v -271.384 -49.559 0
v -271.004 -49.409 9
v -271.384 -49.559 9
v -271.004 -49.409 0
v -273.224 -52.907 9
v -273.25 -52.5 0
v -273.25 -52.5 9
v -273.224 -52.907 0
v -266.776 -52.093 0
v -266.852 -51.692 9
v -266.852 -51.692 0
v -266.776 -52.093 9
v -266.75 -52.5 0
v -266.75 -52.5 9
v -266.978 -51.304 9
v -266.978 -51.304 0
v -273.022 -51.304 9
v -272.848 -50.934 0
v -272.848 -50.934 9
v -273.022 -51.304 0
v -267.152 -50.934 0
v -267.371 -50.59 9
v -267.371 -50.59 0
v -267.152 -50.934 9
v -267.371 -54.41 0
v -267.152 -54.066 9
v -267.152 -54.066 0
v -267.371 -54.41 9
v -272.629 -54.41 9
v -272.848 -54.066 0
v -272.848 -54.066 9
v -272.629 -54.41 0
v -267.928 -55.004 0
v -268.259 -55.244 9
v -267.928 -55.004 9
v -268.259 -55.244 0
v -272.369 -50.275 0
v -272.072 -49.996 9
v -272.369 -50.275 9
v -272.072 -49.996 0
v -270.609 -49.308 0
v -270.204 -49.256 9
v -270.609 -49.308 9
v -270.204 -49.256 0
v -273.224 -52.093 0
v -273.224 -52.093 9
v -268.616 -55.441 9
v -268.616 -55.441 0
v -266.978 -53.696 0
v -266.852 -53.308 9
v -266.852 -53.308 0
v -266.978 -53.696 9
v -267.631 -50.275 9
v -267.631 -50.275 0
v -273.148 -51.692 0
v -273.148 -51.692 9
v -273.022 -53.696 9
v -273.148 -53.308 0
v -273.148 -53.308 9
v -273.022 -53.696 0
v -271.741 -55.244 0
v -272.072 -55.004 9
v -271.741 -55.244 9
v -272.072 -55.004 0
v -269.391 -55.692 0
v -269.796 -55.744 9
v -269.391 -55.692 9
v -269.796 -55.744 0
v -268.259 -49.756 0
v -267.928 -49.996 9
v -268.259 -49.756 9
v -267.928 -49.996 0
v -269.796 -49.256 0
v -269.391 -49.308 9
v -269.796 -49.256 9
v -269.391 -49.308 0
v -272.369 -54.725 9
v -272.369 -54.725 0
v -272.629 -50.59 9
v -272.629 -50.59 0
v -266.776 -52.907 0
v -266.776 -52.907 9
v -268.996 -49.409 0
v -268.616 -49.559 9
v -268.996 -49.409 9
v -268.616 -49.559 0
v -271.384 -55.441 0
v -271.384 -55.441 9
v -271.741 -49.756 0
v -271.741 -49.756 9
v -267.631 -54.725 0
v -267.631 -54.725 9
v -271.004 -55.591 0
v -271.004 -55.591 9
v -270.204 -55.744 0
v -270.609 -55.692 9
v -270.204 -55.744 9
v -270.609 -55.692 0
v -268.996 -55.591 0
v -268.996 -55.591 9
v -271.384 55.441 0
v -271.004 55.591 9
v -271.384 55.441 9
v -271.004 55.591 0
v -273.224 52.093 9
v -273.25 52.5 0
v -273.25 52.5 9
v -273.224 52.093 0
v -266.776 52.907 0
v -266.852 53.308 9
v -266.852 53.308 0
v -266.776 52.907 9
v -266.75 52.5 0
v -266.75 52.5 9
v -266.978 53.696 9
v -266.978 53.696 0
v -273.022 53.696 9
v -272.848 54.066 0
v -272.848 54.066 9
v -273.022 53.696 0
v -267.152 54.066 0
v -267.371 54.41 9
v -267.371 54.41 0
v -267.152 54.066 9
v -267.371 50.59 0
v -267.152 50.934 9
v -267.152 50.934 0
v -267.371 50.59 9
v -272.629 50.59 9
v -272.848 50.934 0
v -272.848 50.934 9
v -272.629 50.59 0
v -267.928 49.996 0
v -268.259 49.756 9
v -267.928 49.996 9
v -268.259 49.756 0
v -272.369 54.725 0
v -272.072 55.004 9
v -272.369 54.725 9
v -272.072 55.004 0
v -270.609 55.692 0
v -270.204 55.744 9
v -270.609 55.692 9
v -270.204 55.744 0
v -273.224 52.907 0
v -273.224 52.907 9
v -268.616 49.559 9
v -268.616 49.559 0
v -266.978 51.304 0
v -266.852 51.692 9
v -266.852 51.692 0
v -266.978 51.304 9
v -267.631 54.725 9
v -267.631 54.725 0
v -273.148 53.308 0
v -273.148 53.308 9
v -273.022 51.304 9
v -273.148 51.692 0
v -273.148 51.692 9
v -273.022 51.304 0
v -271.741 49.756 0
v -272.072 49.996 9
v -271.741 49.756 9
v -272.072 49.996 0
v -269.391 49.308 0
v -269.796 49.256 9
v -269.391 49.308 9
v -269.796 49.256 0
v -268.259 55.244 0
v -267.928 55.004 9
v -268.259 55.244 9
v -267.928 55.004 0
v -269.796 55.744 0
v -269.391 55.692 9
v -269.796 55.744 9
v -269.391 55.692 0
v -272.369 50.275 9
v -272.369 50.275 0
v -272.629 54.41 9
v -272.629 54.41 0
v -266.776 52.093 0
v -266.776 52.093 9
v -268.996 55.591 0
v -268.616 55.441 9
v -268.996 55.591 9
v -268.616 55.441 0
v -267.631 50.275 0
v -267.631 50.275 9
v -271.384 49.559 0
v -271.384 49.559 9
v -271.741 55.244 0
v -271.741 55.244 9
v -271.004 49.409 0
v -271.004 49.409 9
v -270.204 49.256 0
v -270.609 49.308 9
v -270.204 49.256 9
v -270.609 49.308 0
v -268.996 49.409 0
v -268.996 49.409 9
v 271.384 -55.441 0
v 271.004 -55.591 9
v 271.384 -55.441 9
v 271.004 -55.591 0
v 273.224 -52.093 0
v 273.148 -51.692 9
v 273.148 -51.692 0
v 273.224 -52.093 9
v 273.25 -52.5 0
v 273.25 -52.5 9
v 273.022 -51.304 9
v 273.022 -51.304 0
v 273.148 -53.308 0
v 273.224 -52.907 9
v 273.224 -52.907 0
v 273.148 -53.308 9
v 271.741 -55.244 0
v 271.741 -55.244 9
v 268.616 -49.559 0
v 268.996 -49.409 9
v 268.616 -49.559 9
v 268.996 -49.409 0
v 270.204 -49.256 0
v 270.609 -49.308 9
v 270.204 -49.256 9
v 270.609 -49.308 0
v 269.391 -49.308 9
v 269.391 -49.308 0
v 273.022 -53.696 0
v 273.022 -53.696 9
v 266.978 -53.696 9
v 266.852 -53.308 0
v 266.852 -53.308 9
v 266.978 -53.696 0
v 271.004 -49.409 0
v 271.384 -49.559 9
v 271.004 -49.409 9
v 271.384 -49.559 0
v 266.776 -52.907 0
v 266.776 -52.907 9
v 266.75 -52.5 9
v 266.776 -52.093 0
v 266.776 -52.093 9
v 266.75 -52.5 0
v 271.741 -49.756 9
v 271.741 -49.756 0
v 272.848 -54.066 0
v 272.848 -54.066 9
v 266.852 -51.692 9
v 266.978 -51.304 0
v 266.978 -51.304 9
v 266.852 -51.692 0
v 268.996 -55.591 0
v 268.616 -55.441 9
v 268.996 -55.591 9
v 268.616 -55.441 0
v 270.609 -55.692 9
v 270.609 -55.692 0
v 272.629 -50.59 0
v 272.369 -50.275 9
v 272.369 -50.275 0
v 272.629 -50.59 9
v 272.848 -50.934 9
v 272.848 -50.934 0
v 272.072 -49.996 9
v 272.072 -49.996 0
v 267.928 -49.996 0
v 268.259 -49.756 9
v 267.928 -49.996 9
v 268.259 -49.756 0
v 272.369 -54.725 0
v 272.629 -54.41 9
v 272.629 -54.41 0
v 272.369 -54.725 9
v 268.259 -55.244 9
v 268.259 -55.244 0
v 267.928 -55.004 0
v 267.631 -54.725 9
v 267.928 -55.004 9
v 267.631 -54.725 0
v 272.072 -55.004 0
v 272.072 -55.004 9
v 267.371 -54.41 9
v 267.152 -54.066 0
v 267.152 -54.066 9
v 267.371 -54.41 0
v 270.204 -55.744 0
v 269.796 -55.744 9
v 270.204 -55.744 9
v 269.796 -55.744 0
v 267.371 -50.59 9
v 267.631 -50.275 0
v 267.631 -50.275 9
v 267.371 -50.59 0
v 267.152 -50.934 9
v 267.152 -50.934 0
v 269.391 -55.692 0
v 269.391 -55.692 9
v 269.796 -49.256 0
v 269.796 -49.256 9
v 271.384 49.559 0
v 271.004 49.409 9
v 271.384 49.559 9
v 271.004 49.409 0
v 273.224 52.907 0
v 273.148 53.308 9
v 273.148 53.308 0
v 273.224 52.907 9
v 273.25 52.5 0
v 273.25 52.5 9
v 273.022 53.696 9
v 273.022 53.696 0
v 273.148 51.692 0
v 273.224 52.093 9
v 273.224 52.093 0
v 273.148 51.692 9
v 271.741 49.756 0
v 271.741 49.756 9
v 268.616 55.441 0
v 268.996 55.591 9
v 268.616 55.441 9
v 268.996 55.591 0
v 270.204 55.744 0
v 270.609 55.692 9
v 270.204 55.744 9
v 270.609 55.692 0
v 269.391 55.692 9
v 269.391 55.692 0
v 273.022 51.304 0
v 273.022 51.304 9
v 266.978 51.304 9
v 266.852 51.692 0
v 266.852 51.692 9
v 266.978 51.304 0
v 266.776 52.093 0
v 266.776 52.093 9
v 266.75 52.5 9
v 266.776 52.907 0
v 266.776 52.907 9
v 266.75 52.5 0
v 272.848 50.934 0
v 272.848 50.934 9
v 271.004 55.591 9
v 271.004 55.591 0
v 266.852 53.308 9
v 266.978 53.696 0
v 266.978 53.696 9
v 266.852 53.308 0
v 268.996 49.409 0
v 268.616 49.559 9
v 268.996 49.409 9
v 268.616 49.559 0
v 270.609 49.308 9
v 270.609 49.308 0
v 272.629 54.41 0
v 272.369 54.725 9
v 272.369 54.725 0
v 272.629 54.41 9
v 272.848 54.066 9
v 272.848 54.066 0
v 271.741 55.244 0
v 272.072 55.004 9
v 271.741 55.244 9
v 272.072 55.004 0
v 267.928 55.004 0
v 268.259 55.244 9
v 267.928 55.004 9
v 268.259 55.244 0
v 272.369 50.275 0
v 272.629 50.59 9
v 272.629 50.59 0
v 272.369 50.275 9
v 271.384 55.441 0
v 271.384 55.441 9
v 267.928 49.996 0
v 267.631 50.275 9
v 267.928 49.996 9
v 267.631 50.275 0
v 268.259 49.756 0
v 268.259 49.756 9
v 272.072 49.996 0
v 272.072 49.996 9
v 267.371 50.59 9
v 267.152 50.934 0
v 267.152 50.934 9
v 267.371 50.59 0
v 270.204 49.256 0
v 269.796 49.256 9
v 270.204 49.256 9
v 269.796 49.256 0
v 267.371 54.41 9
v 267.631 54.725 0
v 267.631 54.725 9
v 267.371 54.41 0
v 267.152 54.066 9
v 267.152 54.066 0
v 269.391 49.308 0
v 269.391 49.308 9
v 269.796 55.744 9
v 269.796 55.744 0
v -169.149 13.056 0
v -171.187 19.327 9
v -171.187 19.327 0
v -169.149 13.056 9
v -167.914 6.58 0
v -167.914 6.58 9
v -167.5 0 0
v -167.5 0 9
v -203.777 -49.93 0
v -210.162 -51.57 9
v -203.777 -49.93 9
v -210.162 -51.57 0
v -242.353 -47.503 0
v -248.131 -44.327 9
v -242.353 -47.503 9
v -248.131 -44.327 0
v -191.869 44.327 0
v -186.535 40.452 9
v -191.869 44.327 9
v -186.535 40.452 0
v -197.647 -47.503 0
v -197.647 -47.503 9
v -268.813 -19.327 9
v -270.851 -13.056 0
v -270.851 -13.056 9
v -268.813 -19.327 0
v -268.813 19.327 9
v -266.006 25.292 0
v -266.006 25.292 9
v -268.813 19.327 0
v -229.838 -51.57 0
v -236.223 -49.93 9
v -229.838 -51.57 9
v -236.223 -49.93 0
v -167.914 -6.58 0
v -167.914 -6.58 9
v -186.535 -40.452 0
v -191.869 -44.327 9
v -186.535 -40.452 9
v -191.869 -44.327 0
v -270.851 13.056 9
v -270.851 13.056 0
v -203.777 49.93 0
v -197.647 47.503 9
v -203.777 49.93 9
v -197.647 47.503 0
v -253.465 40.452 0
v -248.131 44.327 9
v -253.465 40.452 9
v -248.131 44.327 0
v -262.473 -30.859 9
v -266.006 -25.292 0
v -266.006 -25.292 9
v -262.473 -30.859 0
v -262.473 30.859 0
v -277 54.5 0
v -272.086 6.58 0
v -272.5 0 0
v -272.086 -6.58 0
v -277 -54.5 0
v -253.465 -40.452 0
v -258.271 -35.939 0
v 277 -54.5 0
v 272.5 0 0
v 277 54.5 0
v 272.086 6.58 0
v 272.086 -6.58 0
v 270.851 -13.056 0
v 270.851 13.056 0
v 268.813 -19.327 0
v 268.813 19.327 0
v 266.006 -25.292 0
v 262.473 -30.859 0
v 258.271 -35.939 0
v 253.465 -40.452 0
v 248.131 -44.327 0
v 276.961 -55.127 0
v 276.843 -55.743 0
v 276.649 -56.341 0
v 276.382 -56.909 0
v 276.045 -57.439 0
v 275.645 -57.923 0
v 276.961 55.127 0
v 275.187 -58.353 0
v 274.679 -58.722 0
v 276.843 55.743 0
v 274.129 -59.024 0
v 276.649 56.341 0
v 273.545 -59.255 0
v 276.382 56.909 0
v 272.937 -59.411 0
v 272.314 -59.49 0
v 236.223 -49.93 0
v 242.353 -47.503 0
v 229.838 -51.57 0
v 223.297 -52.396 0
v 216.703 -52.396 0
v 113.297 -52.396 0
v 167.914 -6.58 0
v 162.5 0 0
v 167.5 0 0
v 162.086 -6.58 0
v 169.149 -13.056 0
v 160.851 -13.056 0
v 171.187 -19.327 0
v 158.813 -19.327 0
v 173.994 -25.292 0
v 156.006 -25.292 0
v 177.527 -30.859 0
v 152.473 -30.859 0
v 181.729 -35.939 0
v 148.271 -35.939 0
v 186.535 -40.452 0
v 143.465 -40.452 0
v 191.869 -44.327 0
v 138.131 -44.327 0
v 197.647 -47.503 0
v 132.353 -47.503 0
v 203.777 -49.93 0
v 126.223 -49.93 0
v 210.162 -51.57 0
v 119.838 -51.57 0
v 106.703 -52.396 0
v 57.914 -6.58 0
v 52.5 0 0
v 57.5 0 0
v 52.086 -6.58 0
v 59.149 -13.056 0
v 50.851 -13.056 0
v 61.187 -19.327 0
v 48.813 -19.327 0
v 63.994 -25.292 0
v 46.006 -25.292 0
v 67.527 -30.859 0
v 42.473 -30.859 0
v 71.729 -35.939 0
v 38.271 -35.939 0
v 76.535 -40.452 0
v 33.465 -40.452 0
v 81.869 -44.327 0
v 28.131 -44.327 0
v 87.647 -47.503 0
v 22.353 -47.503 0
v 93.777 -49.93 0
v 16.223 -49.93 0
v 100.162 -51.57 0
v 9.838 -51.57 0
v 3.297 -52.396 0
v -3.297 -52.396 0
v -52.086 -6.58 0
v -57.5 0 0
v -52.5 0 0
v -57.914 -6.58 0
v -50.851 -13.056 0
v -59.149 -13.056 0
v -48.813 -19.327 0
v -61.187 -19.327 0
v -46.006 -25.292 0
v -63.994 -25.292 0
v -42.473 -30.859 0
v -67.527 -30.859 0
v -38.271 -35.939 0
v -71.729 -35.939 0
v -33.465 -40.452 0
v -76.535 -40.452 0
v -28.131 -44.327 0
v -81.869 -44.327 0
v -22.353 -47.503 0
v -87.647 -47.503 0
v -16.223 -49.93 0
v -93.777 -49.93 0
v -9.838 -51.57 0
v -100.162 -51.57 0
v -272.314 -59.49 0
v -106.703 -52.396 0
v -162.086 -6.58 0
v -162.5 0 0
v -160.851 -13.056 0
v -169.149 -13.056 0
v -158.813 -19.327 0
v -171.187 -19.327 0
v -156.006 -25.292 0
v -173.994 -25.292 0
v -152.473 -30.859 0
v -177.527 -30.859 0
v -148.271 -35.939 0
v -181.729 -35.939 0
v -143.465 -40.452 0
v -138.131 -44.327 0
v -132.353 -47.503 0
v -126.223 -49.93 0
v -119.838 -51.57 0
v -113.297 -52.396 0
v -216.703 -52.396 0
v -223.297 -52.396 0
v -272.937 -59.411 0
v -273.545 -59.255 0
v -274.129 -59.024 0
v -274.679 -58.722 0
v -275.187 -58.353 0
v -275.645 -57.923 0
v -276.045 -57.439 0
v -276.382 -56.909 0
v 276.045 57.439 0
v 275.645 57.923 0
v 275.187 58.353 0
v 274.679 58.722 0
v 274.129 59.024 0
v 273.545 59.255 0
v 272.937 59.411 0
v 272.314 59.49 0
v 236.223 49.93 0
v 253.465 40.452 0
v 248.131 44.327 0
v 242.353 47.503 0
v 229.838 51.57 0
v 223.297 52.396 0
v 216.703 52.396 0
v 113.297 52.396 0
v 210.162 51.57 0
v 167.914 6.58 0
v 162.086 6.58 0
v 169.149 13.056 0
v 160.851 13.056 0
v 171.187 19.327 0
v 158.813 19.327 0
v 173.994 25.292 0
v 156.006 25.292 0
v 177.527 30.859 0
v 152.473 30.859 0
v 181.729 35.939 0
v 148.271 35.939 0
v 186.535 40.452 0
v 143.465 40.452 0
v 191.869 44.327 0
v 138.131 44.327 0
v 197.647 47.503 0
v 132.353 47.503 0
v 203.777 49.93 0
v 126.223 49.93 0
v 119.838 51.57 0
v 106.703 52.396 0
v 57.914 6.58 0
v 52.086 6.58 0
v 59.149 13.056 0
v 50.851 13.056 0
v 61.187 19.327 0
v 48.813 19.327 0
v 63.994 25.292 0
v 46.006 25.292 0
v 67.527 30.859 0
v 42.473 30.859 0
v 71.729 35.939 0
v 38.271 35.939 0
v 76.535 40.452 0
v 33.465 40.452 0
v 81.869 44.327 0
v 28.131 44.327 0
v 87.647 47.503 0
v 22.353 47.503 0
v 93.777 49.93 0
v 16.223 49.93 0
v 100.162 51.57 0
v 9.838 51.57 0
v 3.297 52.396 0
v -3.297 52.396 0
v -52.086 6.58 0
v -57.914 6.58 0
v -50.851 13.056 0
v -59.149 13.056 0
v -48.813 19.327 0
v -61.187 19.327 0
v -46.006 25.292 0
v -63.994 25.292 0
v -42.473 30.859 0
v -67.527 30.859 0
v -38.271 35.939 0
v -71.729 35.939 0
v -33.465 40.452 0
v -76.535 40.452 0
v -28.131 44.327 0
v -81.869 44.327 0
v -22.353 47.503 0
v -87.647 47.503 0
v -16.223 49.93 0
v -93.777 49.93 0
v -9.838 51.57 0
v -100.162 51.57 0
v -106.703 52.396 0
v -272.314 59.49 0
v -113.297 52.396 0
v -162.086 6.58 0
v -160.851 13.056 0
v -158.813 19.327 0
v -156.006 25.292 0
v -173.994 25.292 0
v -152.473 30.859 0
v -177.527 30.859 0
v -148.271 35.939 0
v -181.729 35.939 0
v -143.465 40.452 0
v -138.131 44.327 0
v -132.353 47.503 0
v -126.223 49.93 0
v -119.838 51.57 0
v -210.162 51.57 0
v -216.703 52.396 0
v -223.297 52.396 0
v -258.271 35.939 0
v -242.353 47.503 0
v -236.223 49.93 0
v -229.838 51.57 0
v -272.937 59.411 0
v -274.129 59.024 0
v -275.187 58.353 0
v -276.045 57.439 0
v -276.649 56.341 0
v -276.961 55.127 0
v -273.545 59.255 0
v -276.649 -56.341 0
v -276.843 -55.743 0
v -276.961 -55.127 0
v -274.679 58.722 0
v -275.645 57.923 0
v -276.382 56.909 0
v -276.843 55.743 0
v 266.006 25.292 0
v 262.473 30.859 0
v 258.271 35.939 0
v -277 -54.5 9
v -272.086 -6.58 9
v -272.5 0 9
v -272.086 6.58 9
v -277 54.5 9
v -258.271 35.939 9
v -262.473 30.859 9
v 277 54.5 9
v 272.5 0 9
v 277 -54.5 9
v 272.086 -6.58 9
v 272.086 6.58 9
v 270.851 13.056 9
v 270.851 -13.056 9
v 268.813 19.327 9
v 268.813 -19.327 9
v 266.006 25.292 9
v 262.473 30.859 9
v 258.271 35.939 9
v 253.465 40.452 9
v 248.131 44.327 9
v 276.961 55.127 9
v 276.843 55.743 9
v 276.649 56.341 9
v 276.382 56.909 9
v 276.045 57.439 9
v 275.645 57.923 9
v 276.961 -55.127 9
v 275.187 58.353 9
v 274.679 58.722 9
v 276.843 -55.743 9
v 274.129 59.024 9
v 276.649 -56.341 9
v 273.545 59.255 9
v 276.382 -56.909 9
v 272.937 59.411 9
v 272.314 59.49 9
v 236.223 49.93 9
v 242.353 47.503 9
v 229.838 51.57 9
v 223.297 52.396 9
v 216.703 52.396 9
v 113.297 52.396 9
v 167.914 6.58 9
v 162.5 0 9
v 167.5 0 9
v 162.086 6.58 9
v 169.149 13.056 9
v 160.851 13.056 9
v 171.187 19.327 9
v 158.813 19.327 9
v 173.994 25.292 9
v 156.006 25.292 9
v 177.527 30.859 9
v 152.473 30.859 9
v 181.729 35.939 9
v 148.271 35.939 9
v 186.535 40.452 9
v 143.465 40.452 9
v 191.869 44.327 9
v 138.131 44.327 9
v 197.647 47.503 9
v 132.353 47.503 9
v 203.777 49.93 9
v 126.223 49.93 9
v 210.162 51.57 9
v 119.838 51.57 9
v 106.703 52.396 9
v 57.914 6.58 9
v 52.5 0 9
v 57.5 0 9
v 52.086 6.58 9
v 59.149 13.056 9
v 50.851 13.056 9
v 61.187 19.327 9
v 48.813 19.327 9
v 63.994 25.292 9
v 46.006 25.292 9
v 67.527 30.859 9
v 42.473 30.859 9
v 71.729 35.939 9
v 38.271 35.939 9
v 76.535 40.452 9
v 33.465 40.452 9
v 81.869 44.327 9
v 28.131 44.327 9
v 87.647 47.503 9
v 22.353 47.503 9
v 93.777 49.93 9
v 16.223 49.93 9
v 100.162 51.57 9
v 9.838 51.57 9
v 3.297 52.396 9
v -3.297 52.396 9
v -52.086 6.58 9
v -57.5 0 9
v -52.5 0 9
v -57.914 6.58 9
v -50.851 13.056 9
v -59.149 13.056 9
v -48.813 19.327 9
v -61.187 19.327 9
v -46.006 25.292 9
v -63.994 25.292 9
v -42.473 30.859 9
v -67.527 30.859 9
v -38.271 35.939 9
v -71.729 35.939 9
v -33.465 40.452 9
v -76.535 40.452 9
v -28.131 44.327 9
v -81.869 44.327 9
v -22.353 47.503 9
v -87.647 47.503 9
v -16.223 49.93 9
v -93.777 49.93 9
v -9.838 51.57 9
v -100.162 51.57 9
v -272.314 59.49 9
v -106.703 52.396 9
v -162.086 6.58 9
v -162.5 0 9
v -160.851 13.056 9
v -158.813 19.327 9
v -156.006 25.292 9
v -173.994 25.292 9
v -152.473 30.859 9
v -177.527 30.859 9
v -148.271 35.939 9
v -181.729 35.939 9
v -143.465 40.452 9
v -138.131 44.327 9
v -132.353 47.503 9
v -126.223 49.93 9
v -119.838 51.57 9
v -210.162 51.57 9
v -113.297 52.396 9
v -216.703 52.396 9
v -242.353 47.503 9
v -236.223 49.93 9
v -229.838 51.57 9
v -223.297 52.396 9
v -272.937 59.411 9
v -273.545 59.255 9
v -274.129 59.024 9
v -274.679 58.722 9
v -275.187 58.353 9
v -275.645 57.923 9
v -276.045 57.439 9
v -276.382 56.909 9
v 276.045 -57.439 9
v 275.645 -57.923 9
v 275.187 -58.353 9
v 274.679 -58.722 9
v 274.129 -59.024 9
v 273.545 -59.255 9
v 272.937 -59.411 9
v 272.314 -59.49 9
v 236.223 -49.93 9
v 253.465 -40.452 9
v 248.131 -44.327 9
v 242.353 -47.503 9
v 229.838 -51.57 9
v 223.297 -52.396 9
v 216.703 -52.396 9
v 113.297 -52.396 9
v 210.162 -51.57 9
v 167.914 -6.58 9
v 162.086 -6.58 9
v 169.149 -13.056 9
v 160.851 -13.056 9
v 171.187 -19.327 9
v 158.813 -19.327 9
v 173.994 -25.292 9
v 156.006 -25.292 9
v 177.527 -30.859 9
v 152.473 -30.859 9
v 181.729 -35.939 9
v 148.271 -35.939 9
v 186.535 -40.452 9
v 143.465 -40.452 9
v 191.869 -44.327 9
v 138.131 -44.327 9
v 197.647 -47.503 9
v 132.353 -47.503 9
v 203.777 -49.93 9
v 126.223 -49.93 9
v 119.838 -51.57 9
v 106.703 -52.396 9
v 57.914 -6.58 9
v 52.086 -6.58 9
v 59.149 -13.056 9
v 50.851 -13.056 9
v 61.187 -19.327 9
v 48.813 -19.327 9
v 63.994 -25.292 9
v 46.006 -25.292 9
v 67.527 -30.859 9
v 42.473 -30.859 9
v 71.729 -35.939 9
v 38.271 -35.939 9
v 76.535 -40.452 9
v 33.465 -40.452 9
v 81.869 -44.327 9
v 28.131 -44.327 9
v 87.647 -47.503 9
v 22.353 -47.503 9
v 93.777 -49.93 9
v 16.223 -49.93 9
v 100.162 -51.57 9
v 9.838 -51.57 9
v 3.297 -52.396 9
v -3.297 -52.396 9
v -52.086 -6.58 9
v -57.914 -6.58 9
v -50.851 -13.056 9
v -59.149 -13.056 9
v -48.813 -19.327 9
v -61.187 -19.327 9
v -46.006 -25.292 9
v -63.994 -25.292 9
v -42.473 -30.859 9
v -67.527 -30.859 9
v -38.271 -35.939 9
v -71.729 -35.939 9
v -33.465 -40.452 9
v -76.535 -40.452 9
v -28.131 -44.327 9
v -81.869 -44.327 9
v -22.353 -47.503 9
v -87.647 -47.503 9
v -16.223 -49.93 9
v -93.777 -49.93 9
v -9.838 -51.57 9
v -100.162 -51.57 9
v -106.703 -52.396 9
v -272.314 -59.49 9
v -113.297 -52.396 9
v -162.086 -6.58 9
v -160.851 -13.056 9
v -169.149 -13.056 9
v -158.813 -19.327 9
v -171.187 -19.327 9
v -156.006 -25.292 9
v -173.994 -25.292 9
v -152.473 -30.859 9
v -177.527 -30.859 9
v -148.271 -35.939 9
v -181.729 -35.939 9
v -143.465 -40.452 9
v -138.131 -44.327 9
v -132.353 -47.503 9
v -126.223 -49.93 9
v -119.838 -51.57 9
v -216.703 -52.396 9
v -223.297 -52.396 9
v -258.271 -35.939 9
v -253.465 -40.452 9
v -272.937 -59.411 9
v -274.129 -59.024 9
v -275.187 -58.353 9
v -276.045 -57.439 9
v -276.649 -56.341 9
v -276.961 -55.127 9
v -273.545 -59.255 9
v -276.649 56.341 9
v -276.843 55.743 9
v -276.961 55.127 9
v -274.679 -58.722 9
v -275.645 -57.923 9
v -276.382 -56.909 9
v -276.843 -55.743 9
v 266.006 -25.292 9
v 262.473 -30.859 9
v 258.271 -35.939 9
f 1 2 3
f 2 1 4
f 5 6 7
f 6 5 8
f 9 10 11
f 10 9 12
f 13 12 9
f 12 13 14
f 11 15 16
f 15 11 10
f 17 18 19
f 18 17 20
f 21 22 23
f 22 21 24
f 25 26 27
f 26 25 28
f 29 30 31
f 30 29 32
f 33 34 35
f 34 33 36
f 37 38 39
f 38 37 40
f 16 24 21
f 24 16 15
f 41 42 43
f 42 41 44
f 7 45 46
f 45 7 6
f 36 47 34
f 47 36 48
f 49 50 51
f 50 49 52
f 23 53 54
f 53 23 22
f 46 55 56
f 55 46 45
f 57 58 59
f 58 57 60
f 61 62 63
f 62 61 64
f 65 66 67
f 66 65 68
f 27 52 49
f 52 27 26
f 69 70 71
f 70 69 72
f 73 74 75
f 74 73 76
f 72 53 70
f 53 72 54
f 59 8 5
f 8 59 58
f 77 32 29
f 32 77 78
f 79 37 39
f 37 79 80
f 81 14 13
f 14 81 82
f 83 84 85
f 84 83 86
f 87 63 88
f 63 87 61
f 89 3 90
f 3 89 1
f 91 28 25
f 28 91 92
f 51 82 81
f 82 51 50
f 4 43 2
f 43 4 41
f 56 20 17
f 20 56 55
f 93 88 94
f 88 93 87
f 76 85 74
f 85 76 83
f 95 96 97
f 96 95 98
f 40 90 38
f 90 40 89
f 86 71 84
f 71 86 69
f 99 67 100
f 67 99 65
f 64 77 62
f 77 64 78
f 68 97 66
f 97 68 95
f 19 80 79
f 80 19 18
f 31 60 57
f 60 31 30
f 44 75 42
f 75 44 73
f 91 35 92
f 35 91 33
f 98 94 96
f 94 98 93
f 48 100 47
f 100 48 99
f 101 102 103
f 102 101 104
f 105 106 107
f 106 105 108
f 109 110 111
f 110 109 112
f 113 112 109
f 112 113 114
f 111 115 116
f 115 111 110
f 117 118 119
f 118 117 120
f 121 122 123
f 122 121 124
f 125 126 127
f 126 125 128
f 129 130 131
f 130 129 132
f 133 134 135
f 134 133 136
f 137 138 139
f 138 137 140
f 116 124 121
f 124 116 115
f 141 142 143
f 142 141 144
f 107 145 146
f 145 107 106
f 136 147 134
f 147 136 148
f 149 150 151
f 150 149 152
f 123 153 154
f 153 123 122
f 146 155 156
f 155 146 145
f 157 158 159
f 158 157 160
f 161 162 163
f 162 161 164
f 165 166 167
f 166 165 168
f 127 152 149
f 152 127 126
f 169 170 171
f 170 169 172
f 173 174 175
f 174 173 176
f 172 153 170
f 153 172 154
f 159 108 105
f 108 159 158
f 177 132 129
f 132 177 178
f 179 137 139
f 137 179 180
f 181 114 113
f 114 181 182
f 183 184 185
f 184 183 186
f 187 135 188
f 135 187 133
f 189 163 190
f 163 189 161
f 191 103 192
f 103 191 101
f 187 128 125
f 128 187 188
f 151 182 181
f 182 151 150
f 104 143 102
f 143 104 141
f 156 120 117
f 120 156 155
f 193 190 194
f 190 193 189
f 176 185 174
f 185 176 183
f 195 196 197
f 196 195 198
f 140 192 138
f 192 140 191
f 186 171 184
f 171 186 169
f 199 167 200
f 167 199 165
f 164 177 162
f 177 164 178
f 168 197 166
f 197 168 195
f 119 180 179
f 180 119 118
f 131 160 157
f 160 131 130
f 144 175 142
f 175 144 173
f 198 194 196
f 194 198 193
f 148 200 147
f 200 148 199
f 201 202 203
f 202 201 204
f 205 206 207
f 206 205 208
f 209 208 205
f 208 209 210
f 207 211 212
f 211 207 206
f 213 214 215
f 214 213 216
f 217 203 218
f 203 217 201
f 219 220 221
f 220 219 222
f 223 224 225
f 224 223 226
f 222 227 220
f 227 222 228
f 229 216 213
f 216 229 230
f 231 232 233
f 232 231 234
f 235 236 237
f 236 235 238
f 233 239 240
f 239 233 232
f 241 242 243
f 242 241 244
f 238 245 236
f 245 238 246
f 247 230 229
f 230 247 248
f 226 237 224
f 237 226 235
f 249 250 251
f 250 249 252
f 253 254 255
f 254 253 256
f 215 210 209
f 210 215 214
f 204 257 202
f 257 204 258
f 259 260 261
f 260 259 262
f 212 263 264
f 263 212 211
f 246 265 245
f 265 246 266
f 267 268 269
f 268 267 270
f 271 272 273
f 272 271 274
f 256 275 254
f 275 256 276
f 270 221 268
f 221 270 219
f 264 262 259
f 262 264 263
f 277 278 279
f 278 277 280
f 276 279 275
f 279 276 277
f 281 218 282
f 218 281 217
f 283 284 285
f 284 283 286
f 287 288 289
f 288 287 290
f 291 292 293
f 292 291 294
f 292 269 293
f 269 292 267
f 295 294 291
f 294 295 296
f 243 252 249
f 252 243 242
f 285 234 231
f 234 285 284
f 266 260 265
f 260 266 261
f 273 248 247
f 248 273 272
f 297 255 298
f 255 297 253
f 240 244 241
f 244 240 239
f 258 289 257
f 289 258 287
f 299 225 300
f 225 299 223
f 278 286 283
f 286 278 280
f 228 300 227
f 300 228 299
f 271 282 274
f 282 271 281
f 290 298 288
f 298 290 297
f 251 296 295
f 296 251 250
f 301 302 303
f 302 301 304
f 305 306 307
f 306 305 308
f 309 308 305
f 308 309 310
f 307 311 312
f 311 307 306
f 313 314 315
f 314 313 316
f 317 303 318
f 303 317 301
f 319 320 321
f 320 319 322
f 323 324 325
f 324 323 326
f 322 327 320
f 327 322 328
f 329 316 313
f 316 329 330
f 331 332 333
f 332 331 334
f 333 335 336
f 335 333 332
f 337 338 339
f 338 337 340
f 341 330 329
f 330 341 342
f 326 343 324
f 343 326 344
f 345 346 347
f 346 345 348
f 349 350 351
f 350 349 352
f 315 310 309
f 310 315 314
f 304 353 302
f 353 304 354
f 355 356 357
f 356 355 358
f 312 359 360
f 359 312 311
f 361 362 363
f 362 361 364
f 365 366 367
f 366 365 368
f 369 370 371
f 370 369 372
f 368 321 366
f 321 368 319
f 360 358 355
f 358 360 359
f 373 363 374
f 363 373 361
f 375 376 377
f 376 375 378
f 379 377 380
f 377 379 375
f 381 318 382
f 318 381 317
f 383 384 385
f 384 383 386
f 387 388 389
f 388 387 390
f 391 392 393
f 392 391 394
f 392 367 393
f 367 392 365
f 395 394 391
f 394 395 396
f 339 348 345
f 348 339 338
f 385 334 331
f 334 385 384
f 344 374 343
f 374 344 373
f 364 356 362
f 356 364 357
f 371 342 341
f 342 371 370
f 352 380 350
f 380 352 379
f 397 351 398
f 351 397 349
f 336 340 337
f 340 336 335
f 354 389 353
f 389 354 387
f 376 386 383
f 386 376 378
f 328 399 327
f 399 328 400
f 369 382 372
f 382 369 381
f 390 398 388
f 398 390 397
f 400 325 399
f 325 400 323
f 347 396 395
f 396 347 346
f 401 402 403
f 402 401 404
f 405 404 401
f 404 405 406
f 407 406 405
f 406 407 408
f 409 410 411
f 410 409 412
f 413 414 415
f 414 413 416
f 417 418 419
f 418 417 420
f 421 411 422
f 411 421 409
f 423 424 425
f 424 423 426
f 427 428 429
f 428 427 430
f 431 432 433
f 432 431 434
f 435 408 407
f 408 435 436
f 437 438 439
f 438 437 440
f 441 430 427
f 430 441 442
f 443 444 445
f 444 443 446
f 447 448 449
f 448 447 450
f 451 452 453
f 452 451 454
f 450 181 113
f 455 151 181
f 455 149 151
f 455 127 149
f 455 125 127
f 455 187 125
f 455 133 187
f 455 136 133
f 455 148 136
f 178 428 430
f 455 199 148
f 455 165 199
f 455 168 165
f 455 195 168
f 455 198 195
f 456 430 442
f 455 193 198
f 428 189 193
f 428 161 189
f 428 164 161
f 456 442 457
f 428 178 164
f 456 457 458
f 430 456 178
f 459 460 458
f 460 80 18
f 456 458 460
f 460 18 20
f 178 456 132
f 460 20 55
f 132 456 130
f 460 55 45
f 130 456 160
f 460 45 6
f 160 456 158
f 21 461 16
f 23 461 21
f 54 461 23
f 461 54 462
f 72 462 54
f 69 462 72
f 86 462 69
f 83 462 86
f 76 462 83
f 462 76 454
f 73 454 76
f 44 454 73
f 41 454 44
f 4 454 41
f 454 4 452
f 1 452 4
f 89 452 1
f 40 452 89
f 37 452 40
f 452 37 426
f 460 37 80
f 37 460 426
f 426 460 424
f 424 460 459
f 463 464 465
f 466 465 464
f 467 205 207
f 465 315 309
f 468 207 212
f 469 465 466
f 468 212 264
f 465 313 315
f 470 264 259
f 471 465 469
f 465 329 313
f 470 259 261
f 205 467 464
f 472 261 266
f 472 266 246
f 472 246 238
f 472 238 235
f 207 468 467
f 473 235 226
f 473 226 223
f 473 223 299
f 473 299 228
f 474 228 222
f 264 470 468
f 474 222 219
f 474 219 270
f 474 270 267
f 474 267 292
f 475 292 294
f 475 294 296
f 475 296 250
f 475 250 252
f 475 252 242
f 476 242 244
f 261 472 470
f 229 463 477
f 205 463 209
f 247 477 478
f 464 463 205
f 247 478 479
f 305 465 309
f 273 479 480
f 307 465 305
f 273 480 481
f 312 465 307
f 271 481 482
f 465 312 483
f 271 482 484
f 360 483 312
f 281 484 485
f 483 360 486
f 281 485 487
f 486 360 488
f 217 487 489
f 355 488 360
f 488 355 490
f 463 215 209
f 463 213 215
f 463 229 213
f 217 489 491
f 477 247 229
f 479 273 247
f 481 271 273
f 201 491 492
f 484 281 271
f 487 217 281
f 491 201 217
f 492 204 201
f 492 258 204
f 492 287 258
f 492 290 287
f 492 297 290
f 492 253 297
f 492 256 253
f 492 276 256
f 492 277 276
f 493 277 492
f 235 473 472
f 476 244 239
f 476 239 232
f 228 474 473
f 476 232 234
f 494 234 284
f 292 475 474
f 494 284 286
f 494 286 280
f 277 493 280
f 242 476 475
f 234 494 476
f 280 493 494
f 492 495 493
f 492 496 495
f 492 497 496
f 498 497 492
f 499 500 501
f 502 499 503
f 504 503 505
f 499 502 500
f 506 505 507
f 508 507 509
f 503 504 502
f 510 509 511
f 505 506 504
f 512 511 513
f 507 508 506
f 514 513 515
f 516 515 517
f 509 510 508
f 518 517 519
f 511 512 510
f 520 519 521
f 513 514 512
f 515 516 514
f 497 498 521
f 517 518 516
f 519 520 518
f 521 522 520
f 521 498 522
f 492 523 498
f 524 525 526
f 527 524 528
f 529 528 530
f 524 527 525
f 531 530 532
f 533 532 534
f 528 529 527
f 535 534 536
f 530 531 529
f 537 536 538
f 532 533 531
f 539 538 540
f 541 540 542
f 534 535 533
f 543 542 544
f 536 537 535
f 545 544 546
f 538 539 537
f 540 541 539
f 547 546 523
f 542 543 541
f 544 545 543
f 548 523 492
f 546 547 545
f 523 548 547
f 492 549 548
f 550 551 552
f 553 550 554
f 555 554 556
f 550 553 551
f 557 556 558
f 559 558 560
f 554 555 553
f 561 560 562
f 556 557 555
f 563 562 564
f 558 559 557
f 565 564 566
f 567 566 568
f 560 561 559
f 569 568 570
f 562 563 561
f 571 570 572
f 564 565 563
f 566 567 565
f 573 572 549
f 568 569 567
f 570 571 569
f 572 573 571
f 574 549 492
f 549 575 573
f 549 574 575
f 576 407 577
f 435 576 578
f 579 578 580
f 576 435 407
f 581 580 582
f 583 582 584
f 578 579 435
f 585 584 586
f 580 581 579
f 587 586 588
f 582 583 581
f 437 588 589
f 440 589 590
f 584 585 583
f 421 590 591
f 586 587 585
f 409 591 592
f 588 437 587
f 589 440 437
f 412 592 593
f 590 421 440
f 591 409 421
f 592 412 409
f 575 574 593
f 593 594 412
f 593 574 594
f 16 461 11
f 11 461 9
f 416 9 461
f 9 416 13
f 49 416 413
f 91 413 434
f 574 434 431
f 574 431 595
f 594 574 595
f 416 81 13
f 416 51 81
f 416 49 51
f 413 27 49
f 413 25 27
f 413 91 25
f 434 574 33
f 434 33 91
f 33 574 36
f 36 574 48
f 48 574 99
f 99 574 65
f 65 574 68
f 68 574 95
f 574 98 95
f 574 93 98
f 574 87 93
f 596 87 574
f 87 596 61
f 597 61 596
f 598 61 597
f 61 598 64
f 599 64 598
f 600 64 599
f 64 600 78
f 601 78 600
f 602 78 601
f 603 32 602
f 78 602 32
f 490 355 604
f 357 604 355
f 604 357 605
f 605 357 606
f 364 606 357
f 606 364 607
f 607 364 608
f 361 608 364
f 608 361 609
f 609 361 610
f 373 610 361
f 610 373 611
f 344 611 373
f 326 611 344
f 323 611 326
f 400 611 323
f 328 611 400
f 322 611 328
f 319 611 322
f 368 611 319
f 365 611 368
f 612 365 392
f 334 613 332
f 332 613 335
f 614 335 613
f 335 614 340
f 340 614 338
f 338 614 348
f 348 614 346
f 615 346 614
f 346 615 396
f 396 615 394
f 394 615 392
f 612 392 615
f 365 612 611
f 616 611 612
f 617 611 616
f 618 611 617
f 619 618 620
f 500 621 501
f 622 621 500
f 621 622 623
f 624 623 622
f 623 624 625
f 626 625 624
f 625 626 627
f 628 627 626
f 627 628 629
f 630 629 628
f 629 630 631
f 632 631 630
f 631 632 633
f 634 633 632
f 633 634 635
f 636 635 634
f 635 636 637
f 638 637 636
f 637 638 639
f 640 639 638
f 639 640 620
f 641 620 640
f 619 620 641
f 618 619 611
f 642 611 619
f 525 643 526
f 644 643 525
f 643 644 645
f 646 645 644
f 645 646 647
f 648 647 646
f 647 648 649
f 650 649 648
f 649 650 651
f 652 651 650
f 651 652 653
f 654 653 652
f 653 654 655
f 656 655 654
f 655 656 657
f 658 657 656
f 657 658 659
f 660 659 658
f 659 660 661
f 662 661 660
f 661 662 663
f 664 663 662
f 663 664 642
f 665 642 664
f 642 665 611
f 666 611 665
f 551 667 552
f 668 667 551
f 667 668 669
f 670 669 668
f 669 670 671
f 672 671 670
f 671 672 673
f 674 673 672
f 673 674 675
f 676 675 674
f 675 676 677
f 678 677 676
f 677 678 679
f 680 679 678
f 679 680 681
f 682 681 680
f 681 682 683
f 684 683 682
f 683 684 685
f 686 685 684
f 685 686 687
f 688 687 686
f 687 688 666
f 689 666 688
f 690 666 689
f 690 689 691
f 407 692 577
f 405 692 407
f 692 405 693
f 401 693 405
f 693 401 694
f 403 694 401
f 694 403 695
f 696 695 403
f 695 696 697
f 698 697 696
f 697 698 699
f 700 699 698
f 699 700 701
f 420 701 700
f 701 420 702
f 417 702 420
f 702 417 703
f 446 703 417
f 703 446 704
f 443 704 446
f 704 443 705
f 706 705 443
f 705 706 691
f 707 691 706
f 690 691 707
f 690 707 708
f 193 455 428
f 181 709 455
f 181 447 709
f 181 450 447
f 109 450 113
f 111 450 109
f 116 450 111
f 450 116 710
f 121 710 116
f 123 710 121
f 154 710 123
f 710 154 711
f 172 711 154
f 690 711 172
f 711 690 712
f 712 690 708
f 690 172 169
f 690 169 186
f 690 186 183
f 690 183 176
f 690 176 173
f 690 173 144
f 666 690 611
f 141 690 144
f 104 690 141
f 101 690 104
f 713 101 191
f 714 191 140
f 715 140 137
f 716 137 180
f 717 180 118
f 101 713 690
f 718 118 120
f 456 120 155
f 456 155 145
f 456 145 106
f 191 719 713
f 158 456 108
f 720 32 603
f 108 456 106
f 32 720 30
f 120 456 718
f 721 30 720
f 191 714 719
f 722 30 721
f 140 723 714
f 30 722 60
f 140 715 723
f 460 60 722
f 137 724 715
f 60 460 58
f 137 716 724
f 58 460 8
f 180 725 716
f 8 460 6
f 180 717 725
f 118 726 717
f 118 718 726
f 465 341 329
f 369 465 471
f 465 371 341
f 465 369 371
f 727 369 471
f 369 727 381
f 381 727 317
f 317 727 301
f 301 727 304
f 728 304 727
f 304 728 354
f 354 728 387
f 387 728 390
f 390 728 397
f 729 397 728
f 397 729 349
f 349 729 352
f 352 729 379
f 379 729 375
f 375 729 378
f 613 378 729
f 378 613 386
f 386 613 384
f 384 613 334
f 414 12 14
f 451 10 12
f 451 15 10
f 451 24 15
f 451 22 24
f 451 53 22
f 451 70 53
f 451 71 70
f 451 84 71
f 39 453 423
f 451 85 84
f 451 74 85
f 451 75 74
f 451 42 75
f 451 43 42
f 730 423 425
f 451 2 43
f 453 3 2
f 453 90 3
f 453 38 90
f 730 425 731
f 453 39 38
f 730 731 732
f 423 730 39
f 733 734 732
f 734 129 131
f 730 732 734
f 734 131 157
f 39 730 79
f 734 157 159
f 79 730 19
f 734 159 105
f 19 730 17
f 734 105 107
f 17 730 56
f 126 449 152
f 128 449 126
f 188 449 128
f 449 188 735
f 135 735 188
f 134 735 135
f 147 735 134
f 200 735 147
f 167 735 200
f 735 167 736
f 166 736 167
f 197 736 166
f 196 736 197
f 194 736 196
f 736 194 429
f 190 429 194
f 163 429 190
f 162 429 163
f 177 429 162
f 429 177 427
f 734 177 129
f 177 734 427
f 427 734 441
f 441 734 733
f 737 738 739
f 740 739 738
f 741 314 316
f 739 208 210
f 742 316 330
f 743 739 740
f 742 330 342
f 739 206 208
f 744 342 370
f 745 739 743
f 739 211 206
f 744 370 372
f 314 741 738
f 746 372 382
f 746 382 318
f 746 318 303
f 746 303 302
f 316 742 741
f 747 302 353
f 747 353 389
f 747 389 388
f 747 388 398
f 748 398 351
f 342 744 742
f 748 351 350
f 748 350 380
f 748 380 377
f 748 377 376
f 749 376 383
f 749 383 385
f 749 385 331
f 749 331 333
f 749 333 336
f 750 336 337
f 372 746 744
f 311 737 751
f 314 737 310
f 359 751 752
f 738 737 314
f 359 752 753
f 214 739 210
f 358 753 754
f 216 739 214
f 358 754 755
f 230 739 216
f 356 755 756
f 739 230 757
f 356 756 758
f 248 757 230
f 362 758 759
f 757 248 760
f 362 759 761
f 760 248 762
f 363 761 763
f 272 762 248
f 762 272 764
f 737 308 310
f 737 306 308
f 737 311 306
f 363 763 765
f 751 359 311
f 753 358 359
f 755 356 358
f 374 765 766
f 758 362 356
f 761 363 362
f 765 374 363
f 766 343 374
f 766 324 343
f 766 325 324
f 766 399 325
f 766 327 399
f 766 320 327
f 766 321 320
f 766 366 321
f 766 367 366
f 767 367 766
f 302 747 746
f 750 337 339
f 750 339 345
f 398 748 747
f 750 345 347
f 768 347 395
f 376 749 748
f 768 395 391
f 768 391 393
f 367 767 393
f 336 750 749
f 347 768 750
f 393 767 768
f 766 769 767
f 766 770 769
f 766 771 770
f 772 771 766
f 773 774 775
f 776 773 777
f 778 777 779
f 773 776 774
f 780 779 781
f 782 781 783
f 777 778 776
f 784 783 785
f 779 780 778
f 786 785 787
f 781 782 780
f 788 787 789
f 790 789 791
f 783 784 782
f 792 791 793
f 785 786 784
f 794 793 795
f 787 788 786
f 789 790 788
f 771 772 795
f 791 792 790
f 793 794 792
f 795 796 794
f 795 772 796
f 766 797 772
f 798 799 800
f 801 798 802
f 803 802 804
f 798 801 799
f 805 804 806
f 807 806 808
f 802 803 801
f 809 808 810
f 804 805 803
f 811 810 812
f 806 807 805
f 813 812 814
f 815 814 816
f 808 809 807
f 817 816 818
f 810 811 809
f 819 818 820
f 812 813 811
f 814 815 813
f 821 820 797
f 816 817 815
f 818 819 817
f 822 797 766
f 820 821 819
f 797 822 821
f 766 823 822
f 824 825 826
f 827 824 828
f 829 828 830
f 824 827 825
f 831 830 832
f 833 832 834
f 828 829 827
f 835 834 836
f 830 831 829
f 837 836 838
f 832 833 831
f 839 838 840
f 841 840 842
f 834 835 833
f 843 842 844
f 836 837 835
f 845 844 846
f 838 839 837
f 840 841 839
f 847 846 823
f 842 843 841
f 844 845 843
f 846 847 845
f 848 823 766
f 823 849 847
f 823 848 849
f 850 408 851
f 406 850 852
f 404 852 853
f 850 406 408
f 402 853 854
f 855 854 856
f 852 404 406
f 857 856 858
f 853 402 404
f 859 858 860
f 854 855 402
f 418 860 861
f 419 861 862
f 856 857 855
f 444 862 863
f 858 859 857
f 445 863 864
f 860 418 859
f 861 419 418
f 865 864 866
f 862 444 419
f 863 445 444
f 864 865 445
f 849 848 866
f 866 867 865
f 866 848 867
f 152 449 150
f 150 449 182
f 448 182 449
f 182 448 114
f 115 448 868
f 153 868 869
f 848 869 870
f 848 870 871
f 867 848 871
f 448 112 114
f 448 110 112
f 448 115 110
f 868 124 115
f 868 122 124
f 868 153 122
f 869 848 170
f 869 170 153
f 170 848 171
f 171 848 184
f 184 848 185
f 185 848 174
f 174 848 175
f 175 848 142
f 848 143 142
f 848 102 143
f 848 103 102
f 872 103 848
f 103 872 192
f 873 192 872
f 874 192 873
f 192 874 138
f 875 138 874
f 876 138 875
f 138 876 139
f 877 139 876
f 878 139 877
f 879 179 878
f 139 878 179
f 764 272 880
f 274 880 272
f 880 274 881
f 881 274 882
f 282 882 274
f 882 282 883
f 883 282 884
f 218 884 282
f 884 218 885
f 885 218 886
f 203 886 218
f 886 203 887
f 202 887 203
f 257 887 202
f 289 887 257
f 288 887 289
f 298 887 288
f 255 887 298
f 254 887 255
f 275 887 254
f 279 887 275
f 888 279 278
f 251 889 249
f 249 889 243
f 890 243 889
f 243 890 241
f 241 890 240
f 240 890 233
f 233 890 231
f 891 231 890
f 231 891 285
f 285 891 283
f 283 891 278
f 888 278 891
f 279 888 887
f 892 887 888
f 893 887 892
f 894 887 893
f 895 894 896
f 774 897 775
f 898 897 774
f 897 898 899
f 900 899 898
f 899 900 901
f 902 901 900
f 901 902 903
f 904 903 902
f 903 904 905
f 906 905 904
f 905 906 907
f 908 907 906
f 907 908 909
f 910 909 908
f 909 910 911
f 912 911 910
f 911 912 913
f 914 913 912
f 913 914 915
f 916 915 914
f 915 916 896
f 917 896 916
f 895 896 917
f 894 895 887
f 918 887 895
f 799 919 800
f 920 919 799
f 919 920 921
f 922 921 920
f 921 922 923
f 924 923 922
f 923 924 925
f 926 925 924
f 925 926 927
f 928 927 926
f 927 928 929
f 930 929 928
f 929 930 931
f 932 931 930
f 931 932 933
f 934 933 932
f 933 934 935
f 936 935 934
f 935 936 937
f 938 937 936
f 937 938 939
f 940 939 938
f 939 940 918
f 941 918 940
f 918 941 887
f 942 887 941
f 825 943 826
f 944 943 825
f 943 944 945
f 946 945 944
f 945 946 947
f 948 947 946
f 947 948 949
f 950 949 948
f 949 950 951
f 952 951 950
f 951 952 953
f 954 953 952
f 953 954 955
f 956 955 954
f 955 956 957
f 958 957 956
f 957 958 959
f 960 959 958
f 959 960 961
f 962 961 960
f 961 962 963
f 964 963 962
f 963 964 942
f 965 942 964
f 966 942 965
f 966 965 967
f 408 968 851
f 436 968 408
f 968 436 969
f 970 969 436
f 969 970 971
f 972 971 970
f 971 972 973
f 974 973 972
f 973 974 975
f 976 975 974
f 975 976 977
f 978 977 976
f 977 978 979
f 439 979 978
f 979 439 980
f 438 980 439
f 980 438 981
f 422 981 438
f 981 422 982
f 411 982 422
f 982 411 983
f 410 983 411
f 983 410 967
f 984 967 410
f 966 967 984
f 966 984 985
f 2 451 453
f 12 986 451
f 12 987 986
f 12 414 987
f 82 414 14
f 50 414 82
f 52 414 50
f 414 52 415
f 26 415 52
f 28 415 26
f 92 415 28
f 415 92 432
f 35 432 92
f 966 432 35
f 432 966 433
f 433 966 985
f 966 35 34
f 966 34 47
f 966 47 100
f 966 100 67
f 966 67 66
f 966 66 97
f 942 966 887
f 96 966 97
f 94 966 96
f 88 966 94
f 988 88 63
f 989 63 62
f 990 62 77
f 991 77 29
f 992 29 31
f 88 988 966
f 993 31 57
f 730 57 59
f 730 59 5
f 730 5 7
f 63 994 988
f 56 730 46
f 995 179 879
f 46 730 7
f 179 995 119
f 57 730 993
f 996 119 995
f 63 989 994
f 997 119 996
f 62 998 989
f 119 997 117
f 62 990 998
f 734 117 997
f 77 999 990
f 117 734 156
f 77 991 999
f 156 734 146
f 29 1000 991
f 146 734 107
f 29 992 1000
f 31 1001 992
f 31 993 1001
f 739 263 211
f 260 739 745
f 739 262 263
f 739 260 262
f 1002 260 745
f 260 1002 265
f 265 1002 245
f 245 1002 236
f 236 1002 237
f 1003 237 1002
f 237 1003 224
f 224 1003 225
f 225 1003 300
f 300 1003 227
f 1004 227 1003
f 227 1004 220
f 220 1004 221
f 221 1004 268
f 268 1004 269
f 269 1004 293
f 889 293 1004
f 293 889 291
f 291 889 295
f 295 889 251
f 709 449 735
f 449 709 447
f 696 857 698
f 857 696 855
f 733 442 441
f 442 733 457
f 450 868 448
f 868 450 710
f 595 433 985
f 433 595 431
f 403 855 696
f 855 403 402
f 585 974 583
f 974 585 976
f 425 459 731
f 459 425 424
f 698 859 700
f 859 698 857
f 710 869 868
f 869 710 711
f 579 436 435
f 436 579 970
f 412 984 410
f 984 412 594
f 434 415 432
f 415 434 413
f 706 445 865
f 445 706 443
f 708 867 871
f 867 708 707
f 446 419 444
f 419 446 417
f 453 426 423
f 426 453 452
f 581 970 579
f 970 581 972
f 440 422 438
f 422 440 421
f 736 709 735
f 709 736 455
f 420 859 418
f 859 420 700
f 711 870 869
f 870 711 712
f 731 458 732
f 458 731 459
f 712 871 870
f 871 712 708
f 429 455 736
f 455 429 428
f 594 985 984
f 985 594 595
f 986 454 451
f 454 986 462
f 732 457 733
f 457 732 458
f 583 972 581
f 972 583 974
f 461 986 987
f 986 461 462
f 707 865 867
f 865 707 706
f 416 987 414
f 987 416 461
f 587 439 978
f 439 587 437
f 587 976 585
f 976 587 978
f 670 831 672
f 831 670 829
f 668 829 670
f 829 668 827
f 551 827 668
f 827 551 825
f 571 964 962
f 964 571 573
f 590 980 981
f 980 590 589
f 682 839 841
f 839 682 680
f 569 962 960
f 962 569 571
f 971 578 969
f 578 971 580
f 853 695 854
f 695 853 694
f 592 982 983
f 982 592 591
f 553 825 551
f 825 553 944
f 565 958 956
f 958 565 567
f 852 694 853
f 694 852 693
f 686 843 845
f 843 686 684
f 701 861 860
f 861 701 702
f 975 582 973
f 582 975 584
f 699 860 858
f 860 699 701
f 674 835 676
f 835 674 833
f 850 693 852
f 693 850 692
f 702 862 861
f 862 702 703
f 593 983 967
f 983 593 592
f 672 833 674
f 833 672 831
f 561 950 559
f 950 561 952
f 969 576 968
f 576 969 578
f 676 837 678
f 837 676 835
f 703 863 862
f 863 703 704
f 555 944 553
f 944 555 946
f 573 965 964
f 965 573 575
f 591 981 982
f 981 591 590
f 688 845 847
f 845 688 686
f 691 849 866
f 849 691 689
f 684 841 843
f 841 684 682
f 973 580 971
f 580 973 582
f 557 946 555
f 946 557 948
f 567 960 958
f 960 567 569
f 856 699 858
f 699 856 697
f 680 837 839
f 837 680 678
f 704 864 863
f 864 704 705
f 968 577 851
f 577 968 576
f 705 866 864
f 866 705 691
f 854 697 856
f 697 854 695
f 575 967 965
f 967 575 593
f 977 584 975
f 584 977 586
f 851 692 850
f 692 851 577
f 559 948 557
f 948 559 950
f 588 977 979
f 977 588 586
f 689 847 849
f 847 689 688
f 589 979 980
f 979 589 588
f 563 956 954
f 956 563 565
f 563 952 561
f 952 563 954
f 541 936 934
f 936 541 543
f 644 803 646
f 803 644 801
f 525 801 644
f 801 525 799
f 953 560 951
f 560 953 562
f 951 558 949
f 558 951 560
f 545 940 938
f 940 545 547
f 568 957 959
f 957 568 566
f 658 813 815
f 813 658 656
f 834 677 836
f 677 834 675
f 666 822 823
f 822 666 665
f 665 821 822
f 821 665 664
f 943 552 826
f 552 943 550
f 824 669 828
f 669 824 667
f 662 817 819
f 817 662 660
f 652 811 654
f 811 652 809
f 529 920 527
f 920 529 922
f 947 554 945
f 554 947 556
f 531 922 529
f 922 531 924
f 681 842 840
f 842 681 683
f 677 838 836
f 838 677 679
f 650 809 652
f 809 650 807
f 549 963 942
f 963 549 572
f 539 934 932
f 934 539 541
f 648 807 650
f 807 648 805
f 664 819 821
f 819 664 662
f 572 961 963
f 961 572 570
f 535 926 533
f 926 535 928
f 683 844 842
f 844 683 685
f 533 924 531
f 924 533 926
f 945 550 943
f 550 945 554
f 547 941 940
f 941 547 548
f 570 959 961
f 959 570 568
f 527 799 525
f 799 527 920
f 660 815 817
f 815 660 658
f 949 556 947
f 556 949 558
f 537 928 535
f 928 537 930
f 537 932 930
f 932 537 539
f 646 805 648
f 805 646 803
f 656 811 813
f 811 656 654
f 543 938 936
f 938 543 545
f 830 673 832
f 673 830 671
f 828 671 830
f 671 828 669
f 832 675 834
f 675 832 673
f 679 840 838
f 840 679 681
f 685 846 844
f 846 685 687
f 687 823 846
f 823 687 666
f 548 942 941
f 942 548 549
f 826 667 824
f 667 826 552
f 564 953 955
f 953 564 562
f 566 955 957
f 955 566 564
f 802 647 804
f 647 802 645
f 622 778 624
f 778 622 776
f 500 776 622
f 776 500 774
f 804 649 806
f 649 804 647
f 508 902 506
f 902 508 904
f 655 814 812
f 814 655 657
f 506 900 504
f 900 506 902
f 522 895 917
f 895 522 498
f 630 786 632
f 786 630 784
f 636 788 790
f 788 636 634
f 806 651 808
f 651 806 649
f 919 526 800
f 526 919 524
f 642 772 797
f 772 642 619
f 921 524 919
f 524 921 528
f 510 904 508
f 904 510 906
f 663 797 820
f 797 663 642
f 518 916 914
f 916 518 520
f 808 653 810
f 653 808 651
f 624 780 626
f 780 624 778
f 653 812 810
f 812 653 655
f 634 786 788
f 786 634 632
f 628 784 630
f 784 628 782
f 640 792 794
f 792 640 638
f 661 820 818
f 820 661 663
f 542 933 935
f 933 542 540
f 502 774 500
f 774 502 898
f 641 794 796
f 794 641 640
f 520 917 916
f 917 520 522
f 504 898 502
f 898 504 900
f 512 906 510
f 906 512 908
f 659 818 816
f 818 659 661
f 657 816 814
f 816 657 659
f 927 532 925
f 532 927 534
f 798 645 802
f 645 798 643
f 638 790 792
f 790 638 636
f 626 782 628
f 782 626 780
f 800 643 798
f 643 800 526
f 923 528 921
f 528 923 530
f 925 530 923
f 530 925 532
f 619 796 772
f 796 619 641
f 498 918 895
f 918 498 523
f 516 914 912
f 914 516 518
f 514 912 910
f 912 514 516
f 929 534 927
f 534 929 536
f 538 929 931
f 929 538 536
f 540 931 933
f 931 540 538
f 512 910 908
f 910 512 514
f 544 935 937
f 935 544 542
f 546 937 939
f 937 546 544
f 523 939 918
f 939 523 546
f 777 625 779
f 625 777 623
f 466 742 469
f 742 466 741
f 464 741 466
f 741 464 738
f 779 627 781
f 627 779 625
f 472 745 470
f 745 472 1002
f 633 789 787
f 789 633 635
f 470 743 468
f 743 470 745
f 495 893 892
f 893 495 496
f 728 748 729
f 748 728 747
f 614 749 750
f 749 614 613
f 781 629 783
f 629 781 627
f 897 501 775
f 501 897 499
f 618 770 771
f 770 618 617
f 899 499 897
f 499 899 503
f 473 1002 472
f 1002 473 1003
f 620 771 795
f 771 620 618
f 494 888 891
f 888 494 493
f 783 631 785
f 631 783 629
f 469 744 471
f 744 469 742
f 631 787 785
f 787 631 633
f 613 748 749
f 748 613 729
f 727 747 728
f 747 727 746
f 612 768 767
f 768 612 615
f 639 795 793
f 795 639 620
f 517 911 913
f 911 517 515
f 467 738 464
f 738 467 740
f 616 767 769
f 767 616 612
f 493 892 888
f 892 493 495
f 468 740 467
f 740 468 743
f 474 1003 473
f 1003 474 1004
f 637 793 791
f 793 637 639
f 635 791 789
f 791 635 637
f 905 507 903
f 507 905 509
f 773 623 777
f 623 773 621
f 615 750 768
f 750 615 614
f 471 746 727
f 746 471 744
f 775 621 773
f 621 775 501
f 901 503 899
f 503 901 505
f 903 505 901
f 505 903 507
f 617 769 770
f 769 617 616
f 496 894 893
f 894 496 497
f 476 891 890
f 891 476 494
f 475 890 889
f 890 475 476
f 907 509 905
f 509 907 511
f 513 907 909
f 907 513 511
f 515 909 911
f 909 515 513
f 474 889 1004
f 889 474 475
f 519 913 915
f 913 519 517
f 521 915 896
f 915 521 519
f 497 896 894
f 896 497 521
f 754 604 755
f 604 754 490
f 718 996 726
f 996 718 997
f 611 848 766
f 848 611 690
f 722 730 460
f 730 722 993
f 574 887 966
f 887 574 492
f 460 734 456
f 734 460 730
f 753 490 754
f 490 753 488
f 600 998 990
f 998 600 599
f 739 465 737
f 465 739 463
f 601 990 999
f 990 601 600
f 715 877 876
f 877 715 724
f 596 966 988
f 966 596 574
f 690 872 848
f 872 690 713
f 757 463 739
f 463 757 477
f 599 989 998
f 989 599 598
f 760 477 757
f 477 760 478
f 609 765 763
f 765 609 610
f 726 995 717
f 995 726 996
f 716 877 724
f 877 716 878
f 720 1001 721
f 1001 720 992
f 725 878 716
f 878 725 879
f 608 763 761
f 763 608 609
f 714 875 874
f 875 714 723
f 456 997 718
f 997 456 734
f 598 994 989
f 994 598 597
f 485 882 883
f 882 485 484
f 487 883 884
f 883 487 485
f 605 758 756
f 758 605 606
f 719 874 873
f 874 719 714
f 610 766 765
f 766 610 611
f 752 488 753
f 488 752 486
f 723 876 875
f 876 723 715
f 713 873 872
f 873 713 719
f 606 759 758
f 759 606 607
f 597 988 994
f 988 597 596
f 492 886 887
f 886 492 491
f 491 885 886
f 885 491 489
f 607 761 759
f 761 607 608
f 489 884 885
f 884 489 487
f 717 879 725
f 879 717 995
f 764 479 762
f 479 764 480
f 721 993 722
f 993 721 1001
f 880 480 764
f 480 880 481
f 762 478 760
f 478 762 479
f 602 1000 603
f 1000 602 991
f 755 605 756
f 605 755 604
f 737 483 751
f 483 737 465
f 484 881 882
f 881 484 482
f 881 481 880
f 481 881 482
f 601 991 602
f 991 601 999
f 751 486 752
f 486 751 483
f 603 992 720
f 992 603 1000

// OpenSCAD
$fn = 50;

difference() {
	union() {
		hull() {
			translate(v = [-272.0, 54.5, 0]) {
				cylinder(h = 9, r = 5);
			}
			translate(v = [272.0, 54.5, 0]) {
				cylinder(h = 9, r = 5);
			}
			translate(v = [-272.0, -54.5, 0]) {
				cylinder(h = 9, r = 5);
			}
			translate(v = [272.0, -54.5, 0]) {
				cylinder(h = 9, r = 5);
			}
		}
	}
	union() {
		translate(v = [-270.0, -52.5, -100.0]) {
			cylinder(h = 200, r = 3.25);
		}
		translate(v = [-270.0, 52.5, -100.0]) {
			cylinder(h = 200, r = 3.25);
		}
		translate(v = [270.0, -52.5, -100.0]) {
			cylinder(h = 200, r = 3.25);
		}
		translate(v = [270.0, 52.5, -100.0]) {
			cylinder(h = 200, r = 3.25);
		}
		translate(v = [-270.0, -52.5, -100.0]) {
			cylinder(h = 200, r = 1.8);
		}
		translate(v = [-270.0, 52.5, -100.0]) {
			cylinder(h = 200, r = 1.8);
		}
		translate(v = [270.0, -52.5, -100.0]) {
			cylinder(h = 200, r = 1.8);
		}
		translate(v = [270.0, 52.5, -100.0]) {
			cylinder(h = 200, r = 1.8);
		}
		translate(v = [-220.0, 0, 0.0]) {
			cylinder(h = 9, r = 52.5);
		}
		translate(v = [-110.0, 0, 0.0]) {
			cylinder(h = 9, r = 52.5);
		}
		cylinder(h = 9, r = 52.5);
		translate(v = [110.0, 0, 0.0]) {
			cylinder(h = 9, r = 52.5);
		}
		translate(v = [220.0, 0, 0.0]) {
			cylinder(h = 9, r = 52.5);
		}
	}
}
